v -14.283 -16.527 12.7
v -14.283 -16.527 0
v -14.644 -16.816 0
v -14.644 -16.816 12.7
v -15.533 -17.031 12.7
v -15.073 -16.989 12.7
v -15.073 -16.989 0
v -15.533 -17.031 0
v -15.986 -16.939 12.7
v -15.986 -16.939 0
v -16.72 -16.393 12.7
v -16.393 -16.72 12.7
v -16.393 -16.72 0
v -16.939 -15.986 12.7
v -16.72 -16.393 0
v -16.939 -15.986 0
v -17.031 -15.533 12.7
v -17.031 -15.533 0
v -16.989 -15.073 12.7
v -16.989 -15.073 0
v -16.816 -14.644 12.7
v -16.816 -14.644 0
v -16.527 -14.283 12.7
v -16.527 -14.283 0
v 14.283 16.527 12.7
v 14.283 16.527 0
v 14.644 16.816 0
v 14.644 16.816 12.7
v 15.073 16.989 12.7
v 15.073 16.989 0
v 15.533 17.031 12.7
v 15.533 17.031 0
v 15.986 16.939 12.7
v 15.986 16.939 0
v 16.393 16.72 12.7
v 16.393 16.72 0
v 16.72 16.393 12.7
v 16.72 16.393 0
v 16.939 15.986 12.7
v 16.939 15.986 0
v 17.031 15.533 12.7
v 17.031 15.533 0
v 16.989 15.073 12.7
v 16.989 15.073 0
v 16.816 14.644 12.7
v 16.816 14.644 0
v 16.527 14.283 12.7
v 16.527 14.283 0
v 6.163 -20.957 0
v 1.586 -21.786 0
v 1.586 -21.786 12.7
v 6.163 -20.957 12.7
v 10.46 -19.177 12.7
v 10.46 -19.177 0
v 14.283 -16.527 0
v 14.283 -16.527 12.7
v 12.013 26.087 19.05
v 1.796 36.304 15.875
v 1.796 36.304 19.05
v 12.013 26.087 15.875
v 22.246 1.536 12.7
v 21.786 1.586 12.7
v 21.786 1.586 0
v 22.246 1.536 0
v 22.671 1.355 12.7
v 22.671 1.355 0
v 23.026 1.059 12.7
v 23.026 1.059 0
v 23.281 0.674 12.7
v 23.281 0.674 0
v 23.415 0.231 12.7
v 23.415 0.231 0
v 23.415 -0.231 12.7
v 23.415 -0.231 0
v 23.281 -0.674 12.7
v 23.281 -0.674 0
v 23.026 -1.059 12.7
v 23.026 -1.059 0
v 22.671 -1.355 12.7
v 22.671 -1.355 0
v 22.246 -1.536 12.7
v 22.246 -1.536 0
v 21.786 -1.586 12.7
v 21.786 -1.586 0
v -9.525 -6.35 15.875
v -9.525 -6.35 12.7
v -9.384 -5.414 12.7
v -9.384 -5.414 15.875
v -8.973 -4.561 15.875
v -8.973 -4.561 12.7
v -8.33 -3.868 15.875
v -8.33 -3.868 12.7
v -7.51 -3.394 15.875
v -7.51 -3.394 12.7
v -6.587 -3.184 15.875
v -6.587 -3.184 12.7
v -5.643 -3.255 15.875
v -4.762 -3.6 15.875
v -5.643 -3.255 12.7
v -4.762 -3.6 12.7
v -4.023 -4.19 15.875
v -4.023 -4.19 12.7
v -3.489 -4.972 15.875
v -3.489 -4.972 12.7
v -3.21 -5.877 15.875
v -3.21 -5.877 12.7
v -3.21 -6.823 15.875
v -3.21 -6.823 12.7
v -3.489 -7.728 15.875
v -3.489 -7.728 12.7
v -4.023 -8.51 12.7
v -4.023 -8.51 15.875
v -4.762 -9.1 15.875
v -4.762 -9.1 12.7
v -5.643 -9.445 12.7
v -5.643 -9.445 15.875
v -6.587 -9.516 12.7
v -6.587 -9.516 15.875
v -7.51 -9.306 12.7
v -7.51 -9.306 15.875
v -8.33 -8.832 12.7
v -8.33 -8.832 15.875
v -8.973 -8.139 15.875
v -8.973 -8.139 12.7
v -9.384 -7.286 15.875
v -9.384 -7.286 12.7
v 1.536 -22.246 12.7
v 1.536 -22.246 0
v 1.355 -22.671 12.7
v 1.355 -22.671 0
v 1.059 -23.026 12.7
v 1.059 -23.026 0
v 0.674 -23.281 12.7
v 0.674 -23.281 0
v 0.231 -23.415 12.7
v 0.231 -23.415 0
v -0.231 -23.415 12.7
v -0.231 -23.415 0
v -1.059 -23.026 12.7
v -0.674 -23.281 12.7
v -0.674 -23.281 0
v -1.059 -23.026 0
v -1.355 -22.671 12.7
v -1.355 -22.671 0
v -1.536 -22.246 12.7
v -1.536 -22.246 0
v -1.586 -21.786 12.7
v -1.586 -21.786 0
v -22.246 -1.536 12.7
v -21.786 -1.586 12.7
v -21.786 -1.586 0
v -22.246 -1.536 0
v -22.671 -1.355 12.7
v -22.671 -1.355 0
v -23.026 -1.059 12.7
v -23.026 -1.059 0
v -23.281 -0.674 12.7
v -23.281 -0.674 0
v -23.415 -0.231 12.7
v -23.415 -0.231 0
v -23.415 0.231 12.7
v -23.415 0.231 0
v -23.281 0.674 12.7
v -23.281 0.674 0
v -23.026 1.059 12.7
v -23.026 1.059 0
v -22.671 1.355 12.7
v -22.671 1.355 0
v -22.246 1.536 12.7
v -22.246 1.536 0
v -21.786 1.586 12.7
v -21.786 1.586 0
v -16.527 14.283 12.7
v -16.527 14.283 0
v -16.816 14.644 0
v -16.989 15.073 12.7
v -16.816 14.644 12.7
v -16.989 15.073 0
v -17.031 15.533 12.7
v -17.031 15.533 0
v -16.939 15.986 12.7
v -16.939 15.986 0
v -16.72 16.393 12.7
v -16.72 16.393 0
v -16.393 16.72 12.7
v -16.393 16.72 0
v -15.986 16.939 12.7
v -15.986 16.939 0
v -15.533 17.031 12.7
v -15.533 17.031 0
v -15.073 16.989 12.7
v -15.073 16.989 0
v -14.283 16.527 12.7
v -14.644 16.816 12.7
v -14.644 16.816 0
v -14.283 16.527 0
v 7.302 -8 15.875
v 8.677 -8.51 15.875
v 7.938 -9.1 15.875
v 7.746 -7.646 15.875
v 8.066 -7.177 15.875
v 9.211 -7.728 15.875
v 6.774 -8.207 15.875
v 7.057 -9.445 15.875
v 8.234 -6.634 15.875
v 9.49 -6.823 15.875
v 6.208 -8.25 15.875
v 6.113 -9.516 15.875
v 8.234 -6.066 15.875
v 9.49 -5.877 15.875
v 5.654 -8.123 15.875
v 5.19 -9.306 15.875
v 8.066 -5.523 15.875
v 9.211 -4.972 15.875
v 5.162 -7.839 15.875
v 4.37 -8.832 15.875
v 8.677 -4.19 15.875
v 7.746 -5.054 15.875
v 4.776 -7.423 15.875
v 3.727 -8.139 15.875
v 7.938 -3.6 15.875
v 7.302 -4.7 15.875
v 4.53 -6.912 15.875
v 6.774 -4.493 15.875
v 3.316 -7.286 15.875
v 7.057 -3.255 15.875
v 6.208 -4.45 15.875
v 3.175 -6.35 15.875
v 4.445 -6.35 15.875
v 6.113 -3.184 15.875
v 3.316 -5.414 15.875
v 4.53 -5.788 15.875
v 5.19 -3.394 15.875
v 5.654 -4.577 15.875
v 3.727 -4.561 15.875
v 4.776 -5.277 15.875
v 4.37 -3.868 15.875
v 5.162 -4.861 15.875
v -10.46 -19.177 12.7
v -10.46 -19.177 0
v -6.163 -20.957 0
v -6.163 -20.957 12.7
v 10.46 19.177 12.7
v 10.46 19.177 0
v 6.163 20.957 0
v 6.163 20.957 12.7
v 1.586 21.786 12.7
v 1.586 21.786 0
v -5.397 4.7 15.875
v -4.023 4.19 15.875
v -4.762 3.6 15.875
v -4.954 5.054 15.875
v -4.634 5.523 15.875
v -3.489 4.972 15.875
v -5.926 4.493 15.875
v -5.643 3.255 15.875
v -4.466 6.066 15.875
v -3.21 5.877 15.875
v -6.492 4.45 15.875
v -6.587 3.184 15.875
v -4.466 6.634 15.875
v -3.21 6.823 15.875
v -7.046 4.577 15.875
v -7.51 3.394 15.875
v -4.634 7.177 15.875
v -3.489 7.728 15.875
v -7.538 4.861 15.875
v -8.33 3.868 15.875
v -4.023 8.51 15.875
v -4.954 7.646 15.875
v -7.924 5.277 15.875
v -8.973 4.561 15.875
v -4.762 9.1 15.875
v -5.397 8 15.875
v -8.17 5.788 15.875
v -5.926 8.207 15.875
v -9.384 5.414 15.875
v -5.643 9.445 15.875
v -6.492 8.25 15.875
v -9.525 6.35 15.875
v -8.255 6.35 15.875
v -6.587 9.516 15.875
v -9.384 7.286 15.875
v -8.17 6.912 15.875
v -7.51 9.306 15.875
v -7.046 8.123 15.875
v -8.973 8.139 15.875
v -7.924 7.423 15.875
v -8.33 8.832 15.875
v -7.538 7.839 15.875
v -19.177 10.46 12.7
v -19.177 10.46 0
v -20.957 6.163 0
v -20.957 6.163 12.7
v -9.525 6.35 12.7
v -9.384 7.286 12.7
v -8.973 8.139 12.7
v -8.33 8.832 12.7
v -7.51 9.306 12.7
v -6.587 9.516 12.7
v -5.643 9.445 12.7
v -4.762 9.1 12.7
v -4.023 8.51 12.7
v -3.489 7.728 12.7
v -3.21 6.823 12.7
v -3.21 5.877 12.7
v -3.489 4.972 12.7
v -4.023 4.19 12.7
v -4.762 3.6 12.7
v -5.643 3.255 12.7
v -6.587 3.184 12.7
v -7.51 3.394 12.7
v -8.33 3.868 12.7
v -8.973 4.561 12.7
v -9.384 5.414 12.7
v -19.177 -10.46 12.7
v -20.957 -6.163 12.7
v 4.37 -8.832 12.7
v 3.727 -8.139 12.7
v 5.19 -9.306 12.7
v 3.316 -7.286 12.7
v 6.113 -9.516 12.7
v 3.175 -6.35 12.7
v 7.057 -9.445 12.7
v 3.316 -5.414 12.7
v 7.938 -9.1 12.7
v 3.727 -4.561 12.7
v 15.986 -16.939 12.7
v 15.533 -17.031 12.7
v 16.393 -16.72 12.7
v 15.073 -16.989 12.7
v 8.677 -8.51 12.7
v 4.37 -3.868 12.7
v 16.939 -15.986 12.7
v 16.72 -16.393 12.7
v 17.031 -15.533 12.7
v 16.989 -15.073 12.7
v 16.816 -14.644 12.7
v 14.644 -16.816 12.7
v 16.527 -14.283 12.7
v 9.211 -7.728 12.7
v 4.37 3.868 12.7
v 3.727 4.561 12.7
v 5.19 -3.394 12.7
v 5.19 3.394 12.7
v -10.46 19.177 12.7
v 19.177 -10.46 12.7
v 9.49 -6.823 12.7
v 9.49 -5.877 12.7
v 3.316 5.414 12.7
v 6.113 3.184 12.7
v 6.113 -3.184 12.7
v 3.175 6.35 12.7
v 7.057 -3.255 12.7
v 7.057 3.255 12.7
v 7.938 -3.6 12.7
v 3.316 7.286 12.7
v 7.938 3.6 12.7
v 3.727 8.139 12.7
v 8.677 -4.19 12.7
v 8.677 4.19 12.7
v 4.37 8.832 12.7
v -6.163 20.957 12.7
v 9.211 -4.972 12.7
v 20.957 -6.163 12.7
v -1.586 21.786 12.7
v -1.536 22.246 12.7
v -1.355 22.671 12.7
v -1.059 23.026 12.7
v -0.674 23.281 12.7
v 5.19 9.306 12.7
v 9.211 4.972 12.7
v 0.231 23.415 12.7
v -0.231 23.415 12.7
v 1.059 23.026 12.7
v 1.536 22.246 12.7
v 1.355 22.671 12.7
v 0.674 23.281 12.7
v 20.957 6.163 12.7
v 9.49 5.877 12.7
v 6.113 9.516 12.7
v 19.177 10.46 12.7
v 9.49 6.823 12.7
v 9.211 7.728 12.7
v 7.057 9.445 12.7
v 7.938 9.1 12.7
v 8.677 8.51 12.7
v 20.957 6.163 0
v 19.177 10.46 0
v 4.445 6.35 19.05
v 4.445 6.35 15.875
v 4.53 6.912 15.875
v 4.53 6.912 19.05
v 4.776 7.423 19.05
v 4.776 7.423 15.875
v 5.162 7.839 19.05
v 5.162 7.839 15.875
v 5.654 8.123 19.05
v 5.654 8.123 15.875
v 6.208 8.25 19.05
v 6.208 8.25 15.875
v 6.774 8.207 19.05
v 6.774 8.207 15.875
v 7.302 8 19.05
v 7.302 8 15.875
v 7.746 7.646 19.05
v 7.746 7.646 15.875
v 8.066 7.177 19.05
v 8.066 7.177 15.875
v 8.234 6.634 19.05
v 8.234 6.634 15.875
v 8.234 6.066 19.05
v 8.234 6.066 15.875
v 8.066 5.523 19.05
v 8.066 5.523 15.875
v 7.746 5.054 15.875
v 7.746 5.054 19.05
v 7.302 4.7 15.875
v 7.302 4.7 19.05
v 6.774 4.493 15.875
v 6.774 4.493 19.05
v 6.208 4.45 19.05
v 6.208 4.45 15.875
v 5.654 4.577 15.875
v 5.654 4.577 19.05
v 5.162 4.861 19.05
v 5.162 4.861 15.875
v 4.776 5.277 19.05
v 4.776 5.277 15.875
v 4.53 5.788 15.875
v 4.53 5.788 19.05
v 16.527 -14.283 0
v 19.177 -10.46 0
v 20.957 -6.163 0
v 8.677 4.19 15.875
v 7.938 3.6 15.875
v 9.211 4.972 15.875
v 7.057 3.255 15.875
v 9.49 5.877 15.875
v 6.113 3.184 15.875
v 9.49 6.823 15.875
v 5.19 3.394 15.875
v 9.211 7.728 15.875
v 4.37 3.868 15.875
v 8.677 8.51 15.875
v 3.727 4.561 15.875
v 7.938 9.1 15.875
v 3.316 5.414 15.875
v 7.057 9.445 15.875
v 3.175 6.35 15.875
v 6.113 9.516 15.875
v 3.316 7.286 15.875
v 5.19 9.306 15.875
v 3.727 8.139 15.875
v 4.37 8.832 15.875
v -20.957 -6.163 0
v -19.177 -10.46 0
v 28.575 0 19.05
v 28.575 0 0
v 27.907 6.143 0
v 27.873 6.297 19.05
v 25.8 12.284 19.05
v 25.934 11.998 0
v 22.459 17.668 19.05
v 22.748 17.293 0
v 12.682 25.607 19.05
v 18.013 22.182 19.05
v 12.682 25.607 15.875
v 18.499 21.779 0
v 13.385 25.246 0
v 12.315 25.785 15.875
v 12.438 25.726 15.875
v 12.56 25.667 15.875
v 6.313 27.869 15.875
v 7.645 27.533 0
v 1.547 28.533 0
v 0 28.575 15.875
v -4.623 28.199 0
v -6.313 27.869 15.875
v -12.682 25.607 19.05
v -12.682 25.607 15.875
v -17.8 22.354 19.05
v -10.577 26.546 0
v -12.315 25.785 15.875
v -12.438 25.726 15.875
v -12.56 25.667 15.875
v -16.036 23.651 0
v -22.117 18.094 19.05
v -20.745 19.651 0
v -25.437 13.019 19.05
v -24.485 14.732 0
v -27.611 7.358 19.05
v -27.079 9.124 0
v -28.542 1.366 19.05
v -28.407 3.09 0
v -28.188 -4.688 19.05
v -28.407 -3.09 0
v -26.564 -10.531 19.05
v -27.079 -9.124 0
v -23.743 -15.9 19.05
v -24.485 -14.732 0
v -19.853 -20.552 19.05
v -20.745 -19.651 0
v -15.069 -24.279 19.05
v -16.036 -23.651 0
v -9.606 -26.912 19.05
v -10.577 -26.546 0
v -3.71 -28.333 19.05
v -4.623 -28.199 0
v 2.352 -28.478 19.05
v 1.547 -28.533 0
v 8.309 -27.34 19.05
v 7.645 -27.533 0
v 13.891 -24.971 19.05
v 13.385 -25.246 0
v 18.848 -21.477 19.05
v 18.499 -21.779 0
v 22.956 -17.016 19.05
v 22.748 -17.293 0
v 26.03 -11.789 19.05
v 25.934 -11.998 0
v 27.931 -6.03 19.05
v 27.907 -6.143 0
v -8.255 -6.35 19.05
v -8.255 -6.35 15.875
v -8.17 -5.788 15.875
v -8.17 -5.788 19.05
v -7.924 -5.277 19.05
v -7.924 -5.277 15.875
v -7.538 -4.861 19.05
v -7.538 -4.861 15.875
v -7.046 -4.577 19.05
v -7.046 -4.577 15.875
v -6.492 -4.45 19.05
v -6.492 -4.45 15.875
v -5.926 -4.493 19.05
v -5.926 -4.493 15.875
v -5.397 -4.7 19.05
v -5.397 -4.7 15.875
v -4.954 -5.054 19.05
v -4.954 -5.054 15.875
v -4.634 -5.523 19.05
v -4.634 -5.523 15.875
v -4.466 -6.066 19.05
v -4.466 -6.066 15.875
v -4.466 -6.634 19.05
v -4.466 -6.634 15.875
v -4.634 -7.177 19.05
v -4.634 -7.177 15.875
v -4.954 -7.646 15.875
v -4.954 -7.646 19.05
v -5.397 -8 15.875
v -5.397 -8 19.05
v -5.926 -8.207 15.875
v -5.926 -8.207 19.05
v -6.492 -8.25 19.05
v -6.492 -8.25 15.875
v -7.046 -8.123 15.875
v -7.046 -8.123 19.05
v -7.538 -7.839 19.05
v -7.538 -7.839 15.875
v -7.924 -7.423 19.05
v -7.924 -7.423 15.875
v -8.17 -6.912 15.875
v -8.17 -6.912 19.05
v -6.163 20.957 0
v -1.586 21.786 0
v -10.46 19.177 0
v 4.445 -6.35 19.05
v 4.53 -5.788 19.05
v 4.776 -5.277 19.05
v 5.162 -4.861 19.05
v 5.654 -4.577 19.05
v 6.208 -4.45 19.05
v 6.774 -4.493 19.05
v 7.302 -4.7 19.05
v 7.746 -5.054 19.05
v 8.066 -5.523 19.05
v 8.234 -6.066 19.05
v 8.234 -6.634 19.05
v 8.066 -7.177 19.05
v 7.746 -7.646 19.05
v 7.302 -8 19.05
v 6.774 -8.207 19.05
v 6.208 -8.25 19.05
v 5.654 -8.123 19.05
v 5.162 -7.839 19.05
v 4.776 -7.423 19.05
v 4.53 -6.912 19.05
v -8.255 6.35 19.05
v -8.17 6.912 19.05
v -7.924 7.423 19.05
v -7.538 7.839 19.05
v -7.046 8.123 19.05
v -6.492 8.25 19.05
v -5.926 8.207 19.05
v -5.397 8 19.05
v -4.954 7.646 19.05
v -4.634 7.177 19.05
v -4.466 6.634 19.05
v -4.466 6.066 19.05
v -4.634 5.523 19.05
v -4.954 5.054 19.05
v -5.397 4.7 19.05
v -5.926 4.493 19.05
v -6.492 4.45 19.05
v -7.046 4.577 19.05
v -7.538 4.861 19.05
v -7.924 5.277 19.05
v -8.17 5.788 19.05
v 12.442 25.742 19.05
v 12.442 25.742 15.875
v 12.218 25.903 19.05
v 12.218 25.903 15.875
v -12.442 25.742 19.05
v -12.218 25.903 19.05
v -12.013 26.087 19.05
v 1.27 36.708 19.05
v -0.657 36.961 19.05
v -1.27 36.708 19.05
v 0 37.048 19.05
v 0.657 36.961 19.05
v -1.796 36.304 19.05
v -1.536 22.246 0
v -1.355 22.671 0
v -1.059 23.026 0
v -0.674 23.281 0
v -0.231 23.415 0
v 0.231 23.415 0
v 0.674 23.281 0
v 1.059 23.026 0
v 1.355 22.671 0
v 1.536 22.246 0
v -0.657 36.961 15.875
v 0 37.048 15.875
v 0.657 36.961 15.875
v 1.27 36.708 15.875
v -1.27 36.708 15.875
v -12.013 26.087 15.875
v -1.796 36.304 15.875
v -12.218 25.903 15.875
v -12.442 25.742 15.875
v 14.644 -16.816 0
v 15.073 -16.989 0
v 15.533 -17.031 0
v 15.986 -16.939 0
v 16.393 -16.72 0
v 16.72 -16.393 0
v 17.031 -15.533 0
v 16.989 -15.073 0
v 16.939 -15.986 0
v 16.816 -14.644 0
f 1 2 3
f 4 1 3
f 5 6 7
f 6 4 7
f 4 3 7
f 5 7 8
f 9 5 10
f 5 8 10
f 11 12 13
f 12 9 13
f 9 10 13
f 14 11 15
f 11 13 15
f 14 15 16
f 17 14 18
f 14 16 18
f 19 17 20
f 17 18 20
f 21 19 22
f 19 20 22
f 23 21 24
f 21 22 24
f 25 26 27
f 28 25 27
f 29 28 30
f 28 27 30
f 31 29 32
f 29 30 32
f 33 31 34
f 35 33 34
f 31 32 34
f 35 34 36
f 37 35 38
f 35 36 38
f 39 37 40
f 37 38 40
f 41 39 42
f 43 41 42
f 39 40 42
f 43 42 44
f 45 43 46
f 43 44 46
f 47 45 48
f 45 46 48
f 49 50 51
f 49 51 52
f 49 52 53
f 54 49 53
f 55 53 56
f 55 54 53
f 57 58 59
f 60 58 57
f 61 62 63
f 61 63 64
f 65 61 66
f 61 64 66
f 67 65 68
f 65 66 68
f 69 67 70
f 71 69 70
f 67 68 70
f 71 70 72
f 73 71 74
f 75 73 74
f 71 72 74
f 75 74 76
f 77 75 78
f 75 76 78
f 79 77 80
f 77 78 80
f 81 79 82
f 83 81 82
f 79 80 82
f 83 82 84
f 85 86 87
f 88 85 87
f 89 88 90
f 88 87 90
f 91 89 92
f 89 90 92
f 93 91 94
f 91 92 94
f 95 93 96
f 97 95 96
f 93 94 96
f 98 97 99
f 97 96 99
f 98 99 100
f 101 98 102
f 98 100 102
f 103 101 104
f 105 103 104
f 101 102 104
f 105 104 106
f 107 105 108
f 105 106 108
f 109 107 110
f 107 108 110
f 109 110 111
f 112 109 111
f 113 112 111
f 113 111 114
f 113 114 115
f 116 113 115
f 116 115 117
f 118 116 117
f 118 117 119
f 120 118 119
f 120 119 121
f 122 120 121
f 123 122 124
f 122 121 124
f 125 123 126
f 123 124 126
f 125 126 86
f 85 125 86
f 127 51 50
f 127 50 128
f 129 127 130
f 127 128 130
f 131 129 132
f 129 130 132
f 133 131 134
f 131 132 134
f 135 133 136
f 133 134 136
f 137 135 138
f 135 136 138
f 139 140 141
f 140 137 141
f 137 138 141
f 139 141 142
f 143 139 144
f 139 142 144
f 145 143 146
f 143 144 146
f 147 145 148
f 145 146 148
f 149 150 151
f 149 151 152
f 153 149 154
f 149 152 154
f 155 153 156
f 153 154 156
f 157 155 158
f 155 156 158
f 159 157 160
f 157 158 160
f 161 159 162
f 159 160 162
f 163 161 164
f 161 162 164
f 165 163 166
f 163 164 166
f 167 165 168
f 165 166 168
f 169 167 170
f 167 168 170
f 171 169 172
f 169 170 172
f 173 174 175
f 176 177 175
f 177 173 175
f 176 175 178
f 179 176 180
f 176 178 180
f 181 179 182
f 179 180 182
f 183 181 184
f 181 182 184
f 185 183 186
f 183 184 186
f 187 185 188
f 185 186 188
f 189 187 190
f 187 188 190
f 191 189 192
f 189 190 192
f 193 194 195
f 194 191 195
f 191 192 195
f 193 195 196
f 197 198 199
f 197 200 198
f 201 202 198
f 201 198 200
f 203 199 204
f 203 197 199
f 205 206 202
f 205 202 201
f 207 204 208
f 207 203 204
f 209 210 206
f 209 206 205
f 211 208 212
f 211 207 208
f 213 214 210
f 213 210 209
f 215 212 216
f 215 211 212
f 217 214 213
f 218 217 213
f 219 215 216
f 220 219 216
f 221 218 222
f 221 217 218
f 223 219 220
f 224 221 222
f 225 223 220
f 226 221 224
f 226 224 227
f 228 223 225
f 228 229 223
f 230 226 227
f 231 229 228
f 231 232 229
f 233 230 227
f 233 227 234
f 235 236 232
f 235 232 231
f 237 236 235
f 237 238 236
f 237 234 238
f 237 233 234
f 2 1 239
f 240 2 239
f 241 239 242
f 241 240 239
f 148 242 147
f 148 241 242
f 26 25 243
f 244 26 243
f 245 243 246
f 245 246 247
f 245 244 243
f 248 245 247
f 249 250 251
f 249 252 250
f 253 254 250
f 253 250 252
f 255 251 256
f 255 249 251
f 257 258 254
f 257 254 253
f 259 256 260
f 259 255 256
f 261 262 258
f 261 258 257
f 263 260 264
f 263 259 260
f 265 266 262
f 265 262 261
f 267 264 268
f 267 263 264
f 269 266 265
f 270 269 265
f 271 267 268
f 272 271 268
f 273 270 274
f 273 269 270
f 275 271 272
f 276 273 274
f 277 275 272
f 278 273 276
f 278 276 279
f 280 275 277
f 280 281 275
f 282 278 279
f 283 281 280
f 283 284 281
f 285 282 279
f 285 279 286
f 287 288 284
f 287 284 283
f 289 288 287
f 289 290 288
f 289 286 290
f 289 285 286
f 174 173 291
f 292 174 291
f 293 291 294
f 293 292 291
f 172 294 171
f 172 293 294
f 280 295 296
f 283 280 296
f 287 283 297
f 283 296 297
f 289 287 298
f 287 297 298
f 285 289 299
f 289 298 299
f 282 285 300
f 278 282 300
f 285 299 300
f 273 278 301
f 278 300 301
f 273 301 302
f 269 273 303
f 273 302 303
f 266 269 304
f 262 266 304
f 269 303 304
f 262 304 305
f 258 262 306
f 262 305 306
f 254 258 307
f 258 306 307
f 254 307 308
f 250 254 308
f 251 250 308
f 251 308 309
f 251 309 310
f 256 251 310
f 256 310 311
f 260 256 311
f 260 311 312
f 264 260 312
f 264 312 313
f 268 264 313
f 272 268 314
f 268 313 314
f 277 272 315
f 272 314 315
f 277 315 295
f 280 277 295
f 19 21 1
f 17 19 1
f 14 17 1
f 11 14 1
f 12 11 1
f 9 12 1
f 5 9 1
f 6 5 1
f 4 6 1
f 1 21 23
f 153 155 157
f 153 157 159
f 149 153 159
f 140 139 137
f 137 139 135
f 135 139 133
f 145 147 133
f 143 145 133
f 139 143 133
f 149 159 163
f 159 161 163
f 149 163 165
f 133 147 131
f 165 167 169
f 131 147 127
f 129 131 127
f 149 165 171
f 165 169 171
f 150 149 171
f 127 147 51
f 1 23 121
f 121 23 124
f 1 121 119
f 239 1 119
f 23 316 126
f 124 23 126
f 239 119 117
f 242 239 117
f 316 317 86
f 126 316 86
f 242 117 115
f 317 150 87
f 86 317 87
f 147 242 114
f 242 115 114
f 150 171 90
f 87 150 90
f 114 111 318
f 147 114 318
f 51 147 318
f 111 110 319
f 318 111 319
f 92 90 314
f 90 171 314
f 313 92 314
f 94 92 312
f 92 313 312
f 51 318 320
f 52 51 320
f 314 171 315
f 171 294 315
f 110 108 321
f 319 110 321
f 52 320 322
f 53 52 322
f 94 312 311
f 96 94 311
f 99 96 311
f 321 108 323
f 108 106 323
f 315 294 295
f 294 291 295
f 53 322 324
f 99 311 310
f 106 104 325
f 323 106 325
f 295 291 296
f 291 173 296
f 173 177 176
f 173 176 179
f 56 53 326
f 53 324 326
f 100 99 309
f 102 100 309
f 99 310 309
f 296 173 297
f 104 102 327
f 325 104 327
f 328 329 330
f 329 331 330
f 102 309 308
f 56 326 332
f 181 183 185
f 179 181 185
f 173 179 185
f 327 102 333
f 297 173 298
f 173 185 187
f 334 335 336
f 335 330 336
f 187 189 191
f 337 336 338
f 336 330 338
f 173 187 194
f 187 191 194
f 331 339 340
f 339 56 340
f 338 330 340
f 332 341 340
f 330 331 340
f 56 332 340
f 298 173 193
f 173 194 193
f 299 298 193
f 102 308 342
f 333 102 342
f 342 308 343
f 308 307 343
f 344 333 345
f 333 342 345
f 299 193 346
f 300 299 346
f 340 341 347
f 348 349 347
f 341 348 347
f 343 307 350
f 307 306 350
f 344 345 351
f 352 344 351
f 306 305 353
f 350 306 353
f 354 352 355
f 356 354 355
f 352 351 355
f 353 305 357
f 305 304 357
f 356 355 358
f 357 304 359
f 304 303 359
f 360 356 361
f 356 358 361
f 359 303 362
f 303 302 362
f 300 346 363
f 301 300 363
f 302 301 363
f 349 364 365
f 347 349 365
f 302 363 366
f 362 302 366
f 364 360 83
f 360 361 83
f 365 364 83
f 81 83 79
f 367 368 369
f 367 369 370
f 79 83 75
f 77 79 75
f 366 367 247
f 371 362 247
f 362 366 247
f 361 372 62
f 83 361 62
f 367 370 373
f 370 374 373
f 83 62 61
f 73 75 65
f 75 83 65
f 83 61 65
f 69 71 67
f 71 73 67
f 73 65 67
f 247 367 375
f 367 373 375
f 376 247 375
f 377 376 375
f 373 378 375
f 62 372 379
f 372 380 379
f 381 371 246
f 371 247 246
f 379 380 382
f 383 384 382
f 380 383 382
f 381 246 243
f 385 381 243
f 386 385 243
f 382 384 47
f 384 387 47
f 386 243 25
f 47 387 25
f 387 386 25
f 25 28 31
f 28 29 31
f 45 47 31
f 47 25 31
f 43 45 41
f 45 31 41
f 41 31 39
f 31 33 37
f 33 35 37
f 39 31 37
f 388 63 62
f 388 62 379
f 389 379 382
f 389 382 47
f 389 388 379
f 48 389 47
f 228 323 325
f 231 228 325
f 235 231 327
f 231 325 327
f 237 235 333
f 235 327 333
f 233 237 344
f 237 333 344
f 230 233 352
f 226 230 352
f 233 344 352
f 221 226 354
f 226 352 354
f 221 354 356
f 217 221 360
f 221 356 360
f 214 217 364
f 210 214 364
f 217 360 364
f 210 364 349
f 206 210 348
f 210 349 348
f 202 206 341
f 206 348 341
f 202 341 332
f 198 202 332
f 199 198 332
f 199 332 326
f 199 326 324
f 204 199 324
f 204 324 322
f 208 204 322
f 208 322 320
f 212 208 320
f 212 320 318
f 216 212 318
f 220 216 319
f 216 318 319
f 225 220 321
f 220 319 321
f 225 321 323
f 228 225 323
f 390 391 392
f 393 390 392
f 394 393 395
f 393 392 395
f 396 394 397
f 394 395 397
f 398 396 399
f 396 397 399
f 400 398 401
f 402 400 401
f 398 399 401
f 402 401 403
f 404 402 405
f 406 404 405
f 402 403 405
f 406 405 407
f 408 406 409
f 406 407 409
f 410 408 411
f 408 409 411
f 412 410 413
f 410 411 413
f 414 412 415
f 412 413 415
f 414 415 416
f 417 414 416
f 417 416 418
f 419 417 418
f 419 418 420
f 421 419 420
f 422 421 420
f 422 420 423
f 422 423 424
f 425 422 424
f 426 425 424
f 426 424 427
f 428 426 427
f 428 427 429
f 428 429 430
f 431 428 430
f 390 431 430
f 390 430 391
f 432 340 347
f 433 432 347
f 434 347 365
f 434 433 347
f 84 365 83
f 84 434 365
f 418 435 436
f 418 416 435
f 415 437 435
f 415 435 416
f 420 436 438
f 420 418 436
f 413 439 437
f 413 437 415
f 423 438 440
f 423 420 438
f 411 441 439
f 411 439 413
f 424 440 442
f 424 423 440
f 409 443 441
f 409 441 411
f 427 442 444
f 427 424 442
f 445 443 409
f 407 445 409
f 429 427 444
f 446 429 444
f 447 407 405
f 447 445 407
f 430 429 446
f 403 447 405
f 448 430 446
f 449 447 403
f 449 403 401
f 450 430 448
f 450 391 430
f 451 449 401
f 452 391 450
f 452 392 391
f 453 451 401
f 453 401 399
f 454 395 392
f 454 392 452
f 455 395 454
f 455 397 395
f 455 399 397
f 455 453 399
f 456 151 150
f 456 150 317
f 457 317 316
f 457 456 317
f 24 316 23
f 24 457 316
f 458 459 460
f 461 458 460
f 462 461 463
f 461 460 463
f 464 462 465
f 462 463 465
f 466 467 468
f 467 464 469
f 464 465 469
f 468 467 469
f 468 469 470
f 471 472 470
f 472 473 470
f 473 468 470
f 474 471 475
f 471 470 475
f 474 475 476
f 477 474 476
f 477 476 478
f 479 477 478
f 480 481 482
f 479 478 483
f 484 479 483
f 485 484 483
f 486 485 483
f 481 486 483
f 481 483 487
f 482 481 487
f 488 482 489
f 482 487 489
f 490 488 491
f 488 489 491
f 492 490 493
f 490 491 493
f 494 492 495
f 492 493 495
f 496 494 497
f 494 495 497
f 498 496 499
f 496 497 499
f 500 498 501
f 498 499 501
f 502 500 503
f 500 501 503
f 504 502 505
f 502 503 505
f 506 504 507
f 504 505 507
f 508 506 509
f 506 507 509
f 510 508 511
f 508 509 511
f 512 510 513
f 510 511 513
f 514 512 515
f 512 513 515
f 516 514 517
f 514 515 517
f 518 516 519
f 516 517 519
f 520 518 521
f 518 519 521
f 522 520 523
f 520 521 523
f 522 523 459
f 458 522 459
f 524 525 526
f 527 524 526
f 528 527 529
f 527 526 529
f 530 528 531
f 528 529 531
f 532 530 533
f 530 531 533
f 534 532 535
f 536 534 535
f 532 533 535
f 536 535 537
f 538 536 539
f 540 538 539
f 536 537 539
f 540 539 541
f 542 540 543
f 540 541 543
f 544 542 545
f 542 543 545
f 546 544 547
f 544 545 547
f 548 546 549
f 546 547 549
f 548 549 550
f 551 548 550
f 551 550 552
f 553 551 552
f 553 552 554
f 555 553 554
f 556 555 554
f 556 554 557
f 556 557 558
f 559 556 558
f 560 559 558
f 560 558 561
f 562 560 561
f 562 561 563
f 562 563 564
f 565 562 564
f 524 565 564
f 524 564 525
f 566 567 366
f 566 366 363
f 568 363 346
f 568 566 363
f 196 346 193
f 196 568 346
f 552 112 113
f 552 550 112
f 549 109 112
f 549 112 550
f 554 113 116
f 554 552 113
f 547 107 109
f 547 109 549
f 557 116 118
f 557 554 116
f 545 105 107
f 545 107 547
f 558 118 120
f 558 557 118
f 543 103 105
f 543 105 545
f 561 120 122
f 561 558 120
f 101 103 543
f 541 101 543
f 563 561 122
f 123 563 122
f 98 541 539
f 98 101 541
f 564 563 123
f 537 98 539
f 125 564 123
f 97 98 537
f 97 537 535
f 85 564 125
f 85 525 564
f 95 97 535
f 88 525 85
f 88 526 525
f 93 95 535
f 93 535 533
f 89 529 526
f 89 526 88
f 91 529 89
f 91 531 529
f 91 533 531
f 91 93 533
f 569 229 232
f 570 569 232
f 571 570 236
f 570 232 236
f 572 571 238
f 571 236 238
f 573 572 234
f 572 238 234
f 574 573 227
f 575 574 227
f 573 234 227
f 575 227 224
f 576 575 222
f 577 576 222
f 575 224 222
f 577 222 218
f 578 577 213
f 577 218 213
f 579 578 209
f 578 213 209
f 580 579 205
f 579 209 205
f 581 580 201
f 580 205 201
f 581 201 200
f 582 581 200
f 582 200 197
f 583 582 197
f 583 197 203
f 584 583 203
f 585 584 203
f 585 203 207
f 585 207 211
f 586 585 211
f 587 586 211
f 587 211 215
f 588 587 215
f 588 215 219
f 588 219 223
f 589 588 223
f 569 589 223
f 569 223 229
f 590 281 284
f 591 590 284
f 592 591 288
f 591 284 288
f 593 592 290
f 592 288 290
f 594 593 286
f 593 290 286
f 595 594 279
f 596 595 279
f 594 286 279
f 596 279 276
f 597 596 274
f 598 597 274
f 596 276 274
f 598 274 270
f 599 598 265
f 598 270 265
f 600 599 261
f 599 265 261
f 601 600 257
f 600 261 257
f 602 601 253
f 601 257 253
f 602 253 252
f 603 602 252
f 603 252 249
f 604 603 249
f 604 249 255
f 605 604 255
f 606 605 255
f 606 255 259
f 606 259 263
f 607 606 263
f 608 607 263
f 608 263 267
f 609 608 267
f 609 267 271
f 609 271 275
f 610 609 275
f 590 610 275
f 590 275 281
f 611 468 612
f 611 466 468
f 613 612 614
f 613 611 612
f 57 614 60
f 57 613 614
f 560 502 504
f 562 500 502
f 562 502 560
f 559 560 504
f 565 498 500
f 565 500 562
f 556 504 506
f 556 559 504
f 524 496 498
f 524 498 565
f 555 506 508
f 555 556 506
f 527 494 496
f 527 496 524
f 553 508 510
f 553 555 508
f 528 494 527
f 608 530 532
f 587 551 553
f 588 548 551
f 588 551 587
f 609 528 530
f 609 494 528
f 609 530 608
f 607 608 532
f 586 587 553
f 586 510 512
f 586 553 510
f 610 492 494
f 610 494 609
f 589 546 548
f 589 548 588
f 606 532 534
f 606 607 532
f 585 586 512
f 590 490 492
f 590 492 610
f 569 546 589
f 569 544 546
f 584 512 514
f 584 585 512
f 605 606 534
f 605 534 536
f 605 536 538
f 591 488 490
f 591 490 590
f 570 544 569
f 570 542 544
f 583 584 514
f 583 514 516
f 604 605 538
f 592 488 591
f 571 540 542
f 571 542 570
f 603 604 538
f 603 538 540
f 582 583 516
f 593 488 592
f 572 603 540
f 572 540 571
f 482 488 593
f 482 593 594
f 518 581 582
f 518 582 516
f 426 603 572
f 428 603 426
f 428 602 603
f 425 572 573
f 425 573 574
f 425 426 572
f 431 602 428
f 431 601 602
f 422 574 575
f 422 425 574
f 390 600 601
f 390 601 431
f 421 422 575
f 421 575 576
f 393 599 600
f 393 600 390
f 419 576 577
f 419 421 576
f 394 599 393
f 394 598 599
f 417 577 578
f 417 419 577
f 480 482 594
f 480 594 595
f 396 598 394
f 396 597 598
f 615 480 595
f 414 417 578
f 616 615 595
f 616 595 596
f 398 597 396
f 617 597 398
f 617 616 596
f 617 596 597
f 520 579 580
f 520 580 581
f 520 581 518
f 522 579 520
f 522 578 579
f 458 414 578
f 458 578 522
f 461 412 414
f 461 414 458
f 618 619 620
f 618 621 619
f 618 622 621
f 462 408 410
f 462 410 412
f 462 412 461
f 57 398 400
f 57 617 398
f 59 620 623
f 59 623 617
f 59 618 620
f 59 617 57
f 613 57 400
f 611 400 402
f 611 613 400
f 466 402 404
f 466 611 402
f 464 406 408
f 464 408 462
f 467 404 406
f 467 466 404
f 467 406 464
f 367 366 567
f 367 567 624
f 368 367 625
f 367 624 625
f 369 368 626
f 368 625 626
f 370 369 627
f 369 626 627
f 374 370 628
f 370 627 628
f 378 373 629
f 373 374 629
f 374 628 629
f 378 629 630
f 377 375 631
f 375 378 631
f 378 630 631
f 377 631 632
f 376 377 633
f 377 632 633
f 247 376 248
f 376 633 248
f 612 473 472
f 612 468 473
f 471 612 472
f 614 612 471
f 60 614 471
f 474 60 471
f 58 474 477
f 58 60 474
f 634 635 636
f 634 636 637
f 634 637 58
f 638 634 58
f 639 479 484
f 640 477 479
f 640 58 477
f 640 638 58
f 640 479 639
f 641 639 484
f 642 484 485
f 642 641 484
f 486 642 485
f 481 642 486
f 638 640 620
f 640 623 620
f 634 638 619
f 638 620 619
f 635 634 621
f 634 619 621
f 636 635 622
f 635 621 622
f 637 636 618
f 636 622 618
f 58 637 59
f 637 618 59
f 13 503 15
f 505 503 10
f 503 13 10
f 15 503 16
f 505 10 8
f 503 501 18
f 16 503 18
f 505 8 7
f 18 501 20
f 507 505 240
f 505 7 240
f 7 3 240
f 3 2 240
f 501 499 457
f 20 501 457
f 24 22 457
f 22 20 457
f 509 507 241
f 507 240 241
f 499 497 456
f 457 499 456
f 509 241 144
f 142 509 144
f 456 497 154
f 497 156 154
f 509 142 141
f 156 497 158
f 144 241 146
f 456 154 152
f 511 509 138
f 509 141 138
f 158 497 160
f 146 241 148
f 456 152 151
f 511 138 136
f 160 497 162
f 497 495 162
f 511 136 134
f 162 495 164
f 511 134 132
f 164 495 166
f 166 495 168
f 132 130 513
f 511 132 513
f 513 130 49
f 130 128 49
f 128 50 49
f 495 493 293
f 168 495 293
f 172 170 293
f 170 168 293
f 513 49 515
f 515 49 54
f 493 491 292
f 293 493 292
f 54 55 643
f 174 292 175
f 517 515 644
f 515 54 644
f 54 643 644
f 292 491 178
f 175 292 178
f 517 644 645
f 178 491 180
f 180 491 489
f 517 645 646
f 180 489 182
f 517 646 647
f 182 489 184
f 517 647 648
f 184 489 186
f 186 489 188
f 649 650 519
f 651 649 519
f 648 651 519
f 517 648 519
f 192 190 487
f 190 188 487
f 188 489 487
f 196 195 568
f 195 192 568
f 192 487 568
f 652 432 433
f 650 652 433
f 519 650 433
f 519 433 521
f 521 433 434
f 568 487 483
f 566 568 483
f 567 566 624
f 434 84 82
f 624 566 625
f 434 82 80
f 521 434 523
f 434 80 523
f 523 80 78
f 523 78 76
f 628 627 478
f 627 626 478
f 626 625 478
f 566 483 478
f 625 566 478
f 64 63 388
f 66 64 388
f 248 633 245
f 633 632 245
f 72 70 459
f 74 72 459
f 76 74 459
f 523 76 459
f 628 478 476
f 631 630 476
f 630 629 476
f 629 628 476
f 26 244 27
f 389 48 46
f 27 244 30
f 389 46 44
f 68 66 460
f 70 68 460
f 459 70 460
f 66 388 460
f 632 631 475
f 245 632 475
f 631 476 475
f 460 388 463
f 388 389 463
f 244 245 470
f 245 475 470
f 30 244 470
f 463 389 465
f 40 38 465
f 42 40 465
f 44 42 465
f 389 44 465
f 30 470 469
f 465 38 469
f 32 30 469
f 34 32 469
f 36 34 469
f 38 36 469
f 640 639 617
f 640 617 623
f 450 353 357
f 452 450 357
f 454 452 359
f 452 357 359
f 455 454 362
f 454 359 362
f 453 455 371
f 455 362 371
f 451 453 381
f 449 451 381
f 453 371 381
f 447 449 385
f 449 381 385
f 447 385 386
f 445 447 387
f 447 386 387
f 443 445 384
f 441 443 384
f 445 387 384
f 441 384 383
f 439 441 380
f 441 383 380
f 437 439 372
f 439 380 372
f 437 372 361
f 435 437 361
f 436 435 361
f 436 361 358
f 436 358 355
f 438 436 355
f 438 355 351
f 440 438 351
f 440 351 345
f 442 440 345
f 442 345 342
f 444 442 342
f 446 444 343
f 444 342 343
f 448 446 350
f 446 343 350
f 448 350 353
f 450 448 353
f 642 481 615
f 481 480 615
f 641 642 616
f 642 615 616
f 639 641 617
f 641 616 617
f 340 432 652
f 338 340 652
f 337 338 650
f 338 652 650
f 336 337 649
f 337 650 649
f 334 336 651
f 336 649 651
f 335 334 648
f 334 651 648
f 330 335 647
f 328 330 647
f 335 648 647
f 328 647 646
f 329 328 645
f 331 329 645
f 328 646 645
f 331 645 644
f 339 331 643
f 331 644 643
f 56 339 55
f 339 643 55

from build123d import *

# Parameters (mm, degrees)
SKETCH1_R           = 28.575
SKETCH1_R_2         = 21.844
BOSS_EXTRUDE1_DEPTH = 12.7
SKETCH2_R           = 28.575
BOSS_EXTRUDE2_DEPTH = 6.35
BOSS_EXTRUDE3_START = -3.175
BOSS_EXTRUDE3_DEPTH = 3.175
FILLET1_R           = 2.54
SKETCH4_R           = 1.5875
CUT_EXTRUDE1_DEPTH  = 12.7
SKETCH5_R           = 3.175
CUT_EXTRUDE2_DEPTH  = 3.175
SKETCH6_R           = 1.905
CUT_EXTRUDE3_DEPTH  = 50.407418097


with BuildPart() as part:
    # Sketch1 → Boss-Extrude1 (new body)
    with BuildSketch(Plane.XY):
        Circle(SKETCH1_R)
        Circle(SKETCH1_R_2, mode=Mode.SUBTRACT)
    extrude(amount=BOSS_EXTRUDE1_DEPTH)

    # Sketch2 → Boss-Extrude2 (add)
    with BuildSketch(Plane.XY.offset(12.7)):
        Circle(SKETCH2_R)
    extrude(amount=BOSS_EXTRUDE2_DEPTH)

    # Sketch3 → Boss-Extrude3 (add)
    with BuildSketch(Plane.XY.offset(19.05).offset(BOSS_EXTRUDE3_START)):
        with BuildLine():
            Line((-12.314807909, 25.785192091), (0, 38.1))
            Line((0, 38.1), (12.314807909, 25.785192091))
            ThreePointArc((12.314807909, 25.785192091), (0, 28.575), (-12.314807909, 25.785192091))
        make_face()
    extrude(amount=BOSS_EXTRUDE3_DEPTH)

    # Fillet1
    fillet1_edges = [part.edges().sort_by_distance(p)[0] for p in [
        (12.314807909, 25.785192091, 17.4625),
        (-12.314807909, 25.785192091, 17.4625),
        (0, 38.1, 17.4625),
    ]]
    fillet(fillet1_edges, radius=FILLET1_R)

    # Sketch4 → Cut-Extrude1 (cut)
    with BuildSketch(Plane(origin=(0, 0, 0), x_dir=(-1, 0, 0), z_dir=(0, 0, -1))):
        with Locations((0, 21.844)):
            Circle(SKETCH4_R)
        with Locations((15.446040528, 15.446040528)):
            Circle(SKETCH4_R)
        with Locations((21.844, 0)):
            Circle(SKETCH4_R)
        with Locations((15.446040528, -15.446040528)):
            Circle(SKETCH4_R)
        with Locations((0, -21.844)):
            Circle(SKETCH4_R)
        with Locations((-15.446040528, -15.446040528)):
            Circle(SKETCH4_R)
        with Locations((-21.844, 0)):
            Circle(SKETCH4_R)
        with Locations((-15.446040528, 15.446040528)):
            Circle(SKETCH4_R)
    extrude(amount=-CUT_EXTRUDE1_DEPTH, mode=Mode.SUBTRACT)

    # Sketch5 → Cut-Extrude2 (cut)
    with BuildSketch(Plane(origin=(0, 0, 12.7), x_dir=(-1, 0, 0), z_dir=(0, 0, -1))):
        with Locations((-6.35, 6.35)):
            Circle(SKETCH5_R)
        with Locations((6.35, 6.35)):
            Circle(SKETCH5_R)
        with Locations((6.35, -6.35)):
            Circle(SKETCH5_R)
        with Locations((-6.35, -6.35)):
            Circle(SKETCH5_R)
    extrude(amount=-CUT_EXTRUDE2_DEPTH, mode=Mode.SUBTRACT)

    # Sketch6 → Cut-Extrude3 (cut, through all)
    with BuildSketch(Plane(origin=(0, 0, 15.875), x_dir=(-1, 0, 0), z_dir=(0, 0, -1))):
        with Locations((-6.35, 6.35)):
            Circle(SKETCH6_R)
        with Locations((6.35, 6.35)):
            Circle(SKETCH6_R)
        with Locations((6.35, -6.35)):
            Circle(SKETCH6_R)
        with Locations((-6.35, -6.35)):
            Circle(SKETCH6_R)
    extrude(amount=-CUT_EXTRUDE3_DEPTH, mode=Mode.SUBTRACT)


solid = part.part
